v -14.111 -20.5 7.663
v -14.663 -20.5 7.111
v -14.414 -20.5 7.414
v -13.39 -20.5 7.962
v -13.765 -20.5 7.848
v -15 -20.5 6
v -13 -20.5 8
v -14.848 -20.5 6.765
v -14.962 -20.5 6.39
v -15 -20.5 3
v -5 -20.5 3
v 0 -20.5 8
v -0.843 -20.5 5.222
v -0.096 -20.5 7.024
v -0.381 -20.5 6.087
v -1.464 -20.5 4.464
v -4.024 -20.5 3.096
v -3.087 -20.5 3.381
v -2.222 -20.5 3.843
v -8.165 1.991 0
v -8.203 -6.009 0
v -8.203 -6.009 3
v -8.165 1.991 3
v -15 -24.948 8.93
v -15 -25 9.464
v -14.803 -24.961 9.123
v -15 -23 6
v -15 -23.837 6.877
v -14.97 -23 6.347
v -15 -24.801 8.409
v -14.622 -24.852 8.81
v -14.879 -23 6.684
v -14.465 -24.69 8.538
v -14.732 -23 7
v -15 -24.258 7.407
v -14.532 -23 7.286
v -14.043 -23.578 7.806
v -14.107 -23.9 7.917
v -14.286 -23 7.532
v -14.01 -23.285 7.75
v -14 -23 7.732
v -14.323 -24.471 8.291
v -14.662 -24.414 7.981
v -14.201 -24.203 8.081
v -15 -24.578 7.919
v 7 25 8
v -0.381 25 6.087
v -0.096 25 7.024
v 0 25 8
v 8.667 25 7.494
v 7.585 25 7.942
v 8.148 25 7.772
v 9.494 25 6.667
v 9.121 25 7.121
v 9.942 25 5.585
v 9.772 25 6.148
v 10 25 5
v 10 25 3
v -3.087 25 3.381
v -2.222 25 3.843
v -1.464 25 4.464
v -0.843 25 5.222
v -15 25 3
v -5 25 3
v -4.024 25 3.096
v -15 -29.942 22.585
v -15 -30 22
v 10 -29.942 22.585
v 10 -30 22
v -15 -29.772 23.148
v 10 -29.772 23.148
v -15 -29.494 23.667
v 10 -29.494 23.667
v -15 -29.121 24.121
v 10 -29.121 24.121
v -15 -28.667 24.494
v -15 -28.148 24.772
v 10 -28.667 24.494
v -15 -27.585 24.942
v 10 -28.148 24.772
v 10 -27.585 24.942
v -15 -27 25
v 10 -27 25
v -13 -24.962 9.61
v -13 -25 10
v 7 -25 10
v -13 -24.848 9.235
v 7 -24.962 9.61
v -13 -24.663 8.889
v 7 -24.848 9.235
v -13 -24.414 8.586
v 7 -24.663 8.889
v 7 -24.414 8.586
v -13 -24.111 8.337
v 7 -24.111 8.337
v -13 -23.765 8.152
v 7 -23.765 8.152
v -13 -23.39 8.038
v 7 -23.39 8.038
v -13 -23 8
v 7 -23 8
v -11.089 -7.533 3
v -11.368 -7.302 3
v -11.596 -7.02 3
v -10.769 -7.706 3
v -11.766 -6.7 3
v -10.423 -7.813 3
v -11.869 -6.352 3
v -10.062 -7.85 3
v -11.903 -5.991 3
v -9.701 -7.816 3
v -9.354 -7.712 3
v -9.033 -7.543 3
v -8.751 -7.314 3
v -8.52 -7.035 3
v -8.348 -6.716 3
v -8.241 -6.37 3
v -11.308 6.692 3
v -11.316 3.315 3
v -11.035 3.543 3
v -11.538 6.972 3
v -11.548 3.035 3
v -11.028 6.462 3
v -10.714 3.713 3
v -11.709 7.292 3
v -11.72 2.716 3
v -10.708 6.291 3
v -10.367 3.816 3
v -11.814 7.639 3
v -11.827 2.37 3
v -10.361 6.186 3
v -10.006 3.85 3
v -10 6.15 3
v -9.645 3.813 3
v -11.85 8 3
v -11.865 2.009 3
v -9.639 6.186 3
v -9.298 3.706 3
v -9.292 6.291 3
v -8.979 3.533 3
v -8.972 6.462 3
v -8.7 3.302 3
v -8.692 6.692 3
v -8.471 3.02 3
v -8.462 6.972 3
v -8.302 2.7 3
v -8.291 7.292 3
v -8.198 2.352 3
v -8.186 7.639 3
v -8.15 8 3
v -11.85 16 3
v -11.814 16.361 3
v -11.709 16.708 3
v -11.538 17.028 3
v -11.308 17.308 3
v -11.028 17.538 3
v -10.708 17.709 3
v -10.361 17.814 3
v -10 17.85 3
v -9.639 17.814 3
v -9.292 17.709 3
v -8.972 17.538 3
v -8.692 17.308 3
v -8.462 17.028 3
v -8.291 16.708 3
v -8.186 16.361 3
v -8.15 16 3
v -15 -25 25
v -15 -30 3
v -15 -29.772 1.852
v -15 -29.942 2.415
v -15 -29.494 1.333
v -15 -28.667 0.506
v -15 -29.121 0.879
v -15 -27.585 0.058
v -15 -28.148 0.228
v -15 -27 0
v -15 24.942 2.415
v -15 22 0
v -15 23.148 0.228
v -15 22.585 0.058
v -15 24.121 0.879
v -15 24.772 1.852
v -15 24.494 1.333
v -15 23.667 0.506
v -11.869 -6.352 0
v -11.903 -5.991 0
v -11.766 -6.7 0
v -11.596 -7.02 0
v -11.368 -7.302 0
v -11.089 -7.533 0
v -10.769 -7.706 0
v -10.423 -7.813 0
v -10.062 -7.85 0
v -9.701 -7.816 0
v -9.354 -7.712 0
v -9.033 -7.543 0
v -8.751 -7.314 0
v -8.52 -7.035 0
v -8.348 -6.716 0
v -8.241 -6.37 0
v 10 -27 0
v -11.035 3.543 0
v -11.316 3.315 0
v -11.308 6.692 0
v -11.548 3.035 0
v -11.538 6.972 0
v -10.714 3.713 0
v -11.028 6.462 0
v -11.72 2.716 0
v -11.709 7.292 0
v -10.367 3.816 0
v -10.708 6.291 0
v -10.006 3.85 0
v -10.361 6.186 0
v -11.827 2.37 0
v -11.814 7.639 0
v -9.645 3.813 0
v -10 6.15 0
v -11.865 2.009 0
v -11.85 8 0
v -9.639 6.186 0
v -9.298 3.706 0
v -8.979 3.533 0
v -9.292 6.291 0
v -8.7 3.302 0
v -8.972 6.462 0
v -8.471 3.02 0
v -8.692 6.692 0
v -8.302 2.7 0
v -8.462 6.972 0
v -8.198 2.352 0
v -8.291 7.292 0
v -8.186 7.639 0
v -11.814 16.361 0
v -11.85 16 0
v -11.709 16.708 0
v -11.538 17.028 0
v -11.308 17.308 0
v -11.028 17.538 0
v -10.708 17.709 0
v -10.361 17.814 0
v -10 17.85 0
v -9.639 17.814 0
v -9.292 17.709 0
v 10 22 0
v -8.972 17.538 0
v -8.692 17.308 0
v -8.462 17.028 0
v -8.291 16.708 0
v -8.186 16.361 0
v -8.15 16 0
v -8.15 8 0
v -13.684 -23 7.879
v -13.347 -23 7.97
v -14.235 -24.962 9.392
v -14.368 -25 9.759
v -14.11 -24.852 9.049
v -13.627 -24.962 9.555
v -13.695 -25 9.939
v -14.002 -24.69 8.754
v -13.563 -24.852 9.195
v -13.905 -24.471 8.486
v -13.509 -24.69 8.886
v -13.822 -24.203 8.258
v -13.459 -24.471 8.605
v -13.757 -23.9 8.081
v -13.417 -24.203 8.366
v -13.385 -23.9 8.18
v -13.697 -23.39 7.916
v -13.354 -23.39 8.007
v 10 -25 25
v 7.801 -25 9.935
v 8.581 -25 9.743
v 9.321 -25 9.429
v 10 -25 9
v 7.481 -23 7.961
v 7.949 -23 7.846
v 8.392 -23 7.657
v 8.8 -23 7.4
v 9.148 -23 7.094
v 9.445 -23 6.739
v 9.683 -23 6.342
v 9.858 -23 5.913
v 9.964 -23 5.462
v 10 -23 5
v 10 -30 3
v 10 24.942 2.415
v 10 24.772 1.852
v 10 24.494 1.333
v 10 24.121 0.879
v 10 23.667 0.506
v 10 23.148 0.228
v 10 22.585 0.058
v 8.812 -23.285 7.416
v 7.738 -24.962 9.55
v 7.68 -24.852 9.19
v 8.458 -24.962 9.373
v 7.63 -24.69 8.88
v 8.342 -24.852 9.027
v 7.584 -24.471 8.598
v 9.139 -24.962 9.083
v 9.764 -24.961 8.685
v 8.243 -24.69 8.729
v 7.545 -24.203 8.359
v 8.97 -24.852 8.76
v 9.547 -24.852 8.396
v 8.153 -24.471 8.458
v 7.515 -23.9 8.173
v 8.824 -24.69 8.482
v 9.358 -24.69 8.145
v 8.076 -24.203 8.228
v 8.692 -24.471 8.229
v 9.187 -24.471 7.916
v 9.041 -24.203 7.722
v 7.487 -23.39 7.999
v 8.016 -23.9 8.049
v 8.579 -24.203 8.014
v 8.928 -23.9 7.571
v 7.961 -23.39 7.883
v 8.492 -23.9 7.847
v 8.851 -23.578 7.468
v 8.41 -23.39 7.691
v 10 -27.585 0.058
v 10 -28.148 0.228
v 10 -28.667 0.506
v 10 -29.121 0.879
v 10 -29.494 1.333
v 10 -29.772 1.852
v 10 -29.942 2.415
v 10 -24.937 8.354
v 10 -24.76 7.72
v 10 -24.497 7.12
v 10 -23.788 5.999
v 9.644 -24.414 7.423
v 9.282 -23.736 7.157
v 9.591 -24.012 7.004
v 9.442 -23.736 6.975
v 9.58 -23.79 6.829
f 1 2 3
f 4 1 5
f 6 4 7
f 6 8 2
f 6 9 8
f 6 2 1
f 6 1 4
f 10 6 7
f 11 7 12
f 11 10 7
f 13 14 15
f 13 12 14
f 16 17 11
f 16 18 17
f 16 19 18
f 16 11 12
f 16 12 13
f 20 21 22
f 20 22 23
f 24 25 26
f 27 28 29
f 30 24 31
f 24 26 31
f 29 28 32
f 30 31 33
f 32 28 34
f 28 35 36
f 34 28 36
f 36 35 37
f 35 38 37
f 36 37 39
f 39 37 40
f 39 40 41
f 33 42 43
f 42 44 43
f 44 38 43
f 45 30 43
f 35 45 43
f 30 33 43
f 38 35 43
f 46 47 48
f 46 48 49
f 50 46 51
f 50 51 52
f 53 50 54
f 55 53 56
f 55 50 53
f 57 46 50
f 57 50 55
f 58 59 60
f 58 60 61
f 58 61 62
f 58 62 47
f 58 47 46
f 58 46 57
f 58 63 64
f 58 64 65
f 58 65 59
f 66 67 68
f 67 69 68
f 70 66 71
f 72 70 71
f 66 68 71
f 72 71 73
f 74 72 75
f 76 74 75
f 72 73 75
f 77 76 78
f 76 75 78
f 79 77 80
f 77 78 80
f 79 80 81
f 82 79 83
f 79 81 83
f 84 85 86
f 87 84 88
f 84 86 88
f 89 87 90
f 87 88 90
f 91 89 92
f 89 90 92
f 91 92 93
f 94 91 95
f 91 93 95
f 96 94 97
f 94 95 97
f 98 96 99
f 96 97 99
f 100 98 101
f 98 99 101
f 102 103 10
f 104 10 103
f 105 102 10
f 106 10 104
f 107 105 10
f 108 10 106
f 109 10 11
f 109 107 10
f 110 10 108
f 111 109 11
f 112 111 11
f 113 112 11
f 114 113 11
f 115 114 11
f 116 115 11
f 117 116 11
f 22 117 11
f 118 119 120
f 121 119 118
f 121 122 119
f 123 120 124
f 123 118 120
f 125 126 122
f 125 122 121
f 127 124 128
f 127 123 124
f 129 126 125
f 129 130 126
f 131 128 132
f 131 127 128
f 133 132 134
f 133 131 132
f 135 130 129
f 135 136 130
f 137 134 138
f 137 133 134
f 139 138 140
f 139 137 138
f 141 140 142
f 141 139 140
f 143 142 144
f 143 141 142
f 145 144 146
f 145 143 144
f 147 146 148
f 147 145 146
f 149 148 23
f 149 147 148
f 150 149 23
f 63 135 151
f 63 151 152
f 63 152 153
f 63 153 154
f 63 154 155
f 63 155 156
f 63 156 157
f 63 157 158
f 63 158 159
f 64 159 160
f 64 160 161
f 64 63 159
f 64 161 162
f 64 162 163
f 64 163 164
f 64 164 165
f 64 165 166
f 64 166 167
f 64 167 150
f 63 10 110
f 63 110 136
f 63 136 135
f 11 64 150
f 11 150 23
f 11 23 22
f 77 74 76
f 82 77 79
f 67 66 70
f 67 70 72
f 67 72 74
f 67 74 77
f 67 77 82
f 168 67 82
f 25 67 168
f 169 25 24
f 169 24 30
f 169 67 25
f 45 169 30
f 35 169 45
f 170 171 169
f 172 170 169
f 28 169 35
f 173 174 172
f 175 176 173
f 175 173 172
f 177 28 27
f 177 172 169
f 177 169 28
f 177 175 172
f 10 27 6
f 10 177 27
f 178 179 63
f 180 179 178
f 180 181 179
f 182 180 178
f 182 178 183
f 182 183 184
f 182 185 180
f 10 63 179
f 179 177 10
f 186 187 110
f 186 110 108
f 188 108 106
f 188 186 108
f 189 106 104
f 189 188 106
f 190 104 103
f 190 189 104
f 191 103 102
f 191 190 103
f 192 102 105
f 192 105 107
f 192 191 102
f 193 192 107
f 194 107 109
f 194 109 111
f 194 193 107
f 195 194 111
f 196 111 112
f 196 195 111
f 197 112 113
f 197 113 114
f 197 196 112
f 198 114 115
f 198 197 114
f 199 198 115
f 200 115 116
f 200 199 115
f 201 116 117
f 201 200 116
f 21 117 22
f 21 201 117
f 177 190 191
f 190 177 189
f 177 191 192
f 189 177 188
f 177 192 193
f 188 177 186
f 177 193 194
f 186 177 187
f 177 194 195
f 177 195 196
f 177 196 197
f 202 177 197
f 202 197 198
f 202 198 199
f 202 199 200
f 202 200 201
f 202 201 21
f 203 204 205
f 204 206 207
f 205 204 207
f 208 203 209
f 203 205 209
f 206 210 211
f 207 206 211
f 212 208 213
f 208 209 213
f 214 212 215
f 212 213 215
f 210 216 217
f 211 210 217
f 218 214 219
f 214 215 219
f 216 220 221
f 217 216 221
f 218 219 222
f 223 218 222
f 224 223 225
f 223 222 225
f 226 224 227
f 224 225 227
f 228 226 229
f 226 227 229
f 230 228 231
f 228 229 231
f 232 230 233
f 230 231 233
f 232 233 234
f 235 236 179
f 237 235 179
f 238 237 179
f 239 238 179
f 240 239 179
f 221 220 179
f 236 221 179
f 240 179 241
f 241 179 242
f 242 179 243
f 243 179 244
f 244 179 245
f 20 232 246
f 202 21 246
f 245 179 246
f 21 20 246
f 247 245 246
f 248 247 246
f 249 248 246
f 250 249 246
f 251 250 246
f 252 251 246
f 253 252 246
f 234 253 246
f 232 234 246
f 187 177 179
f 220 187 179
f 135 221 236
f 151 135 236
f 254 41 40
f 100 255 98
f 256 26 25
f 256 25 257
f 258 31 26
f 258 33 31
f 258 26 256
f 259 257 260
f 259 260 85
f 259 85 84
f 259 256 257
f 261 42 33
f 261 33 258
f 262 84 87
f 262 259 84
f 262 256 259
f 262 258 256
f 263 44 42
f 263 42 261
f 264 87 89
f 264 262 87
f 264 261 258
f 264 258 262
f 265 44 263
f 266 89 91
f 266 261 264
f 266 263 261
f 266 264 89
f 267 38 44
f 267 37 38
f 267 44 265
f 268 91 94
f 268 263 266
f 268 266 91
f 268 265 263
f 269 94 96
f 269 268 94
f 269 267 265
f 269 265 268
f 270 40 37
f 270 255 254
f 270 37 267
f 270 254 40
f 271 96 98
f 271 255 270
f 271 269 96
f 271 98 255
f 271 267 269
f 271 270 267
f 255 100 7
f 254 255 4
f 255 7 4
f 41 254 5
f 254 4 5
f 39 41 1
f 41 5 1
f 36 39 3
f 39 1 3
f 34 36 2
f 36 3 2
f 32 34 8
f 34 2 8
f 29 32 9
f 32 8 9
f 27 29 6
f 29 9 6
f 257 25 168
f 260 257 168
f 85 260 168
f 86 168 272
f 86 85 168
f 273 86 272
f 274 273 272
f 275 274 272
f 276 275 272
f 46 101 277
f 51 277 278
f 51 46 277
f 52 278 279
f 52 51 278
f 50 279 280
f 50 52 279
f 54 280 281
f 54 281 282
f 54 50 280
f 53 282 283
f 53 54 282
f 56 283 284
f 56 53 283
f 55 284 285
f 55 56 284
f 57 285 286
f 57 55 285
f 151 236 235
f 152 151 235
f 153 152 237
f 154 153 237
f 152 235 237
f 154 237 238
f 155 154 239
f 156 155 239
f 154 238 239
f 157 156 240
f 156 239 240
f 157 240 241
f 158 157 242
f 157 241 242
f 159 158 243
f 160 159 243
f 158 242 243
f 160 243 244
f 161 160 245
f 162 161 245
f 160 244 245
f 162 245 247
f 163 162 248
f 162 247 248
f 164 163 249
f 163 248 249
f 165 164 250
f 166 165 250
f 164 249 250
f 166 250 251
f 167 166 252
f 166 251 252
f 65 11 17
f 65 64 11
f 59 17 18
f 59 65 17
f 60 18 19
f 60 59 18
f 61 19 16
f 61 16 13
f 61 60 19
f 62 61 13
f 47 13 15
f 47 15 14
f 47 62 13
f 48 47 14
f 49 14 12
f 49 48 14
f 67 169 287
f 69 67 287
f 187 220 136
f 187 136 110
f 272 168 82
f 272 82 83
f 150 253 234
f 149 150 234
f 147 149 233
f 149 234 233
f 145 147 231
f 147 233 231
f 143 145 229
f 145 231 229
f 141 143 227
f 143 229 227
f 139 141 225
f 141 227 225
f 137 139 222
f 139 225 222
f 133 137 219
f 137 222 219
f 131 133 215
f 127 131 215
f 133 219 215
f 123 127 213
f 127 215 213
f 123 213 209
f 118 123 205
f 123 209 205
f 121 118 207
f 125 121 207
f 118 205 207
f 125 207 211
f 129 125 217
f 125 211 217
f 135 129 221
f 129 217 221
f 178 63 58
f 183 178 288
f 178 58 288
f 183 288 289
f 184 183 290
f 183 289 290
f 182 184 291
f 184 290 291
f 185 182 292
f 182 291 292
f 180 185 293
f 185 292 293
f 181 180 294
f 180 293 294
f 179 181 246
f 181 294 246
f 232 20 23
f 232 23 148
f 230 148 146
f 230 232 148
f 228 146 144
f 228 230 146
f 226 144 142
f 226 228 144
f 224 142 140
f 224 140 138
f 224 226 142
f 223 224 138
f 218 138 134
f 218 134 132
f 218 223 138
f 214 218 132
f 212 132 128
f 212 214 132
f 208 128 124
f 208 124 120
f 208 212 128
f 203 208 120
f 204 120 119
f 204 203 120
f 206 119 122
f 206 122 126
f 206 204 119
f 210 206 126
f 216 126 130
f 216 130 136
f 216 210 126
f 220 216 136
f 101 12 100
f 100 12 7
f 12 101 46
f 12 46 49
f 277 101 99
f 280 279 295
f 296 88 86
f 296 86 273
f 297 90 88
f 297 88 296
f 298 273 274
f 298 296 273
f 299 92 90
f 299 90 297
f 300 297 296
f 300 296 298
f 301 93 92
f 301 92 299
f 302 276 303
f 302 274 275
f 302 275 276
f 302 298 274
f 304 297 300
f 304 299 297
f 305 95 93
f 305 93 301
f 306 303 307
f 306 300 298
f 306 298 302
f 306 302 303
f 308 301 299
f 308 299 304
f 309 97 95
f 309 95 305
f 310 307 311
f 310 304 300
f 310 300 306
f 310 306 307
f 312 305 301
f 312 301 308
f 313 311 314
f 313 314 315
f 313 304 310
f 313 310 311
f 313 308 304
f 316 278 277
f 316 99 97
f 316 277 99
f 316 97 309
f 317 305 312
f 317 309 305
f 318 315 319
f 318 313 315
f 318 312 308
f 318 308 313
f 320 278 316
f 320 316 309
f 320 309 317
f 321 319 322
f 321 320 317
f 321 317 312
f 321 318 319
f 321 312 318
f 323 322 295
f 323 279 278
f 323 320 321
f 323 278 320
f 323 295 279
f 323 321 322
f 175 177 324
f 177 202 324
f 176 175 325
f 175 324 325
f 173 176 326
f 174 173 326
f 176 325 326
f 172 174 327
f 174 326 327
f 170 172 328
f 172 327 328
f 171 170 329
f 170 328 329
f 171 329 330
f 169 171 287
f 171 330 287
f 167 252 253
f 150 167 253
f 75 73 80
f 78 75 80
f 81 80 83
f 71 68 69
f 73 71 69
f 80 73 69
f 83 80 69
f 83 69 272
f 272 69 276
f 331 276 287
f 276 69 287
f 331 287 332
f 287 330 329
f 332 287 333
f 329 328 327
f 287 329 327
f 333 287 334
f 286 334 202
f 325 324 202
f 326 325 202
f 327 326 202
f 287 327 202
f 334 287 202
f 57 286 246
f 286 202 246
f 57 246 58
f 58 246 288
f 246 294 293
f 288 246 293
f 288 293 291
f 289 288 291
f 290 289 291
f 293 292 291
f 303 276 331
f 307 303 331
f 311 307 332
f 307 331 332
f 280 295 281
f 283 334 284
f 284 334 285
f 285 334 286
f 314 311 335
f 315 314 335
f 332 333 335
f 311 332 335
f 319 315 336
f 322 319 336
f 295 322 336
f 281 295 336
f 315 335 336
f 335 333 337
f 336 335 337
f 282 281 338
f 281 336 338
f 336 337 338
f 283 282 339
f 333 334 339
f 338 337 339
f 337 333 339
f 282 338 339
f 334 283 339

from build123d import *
from OCP.BRepFilletAPI import BRepFilletAPI_MakeFillet

# Parameters (mm, degrees)
SKETCH1_W           = 30
SKETCH1_H           = 50
BOSS_EXTRUDE1_DEPTH = 3
SKETCH2_W           = 30
SKETCH2_H           = 5
BOSS_EXTRUDE2_DEPTH = 25
BOSS_EXTRUDE4_START = 3
BOSS_EXTRUDE4_DEPTH = 5
SKETCH6_W           = 5
SKETCH6_H           = 55
CUT_EXTRUDE1_DEPTH  = 35
FILLET3_R           = 5
FILLET5_R           = 3
FILLET5_R_2         = 2
FILLET6_R           = 2


with BuildPart() as part:
    # Sketch1 → Boss-Extrude1 (new body)
    with BuildSketch(Plane.XY):
        Rectangle(SKETCH1_W, SKETCH1_H)
        with BuildLine():
            Line((-11.85, 8), (-11.85, 16))
            ThreePointArc((-11.85, 16), (-10, 17.85), (-8.15, 16))
            Line((-8.15, 16), (-8.15, 8))
            ThreePointArc((-8.15, 8), (-10, 6.15), (-11.85, 8))
        make_face(mode=Mode.SUBTRACT)
        with BuildLine():
            Line((-11.864504809, 2.008993176), (-11.903242133, -5.990913037))
            ThreePointArc((-11.903242133, -5.990913037), (-10.062221828, -7.849849355), (-8.203285509, -6.008829049))
            Line((-8.203285509, -6.008829049), (-8.164548185, 1.991077164))
            ThreePointArc((-8.164548185, 1.991077164), (-10.00556849, 3.850013482), (-11.864504809, 2.008993176))
        make_face(mode=Mode.SUBTRACT)
    extrude(amount=BOSS_EXTRUDE1_DEPTH)

    # Sketch2 → Boss-Extrude2 (add)
    with BuildSketch(Plane.XY):
        with Locations((0, -27.5)):
            Rectangle(SKETCH2_W, SKETCH2_H)
    extrude(amount=BOSS_EXTRUDE2_DEPTH)

    # Sketch4 → Boss-Extrude4 (add)
    with BuildSketch(Plane.XY.offset(BOSS_EXTRUDE4_START)):
        Polygon((15, -25), (0, -25), (-15, -25), (-15, -20.5), (0, -20.5), (0, 25), (15, 25), align=None)
    extrude(amount=BOSS_EXTRUDE4_DEPTH)

    # Sketch6 → Cut-Extrude1 (cut)
    with BuildSketch(Plane.XY):
        with Locations((12.5, -2.5)):
            Rectangle(SKETCH6_W, SKETCH6_H)
    extrude(amount=CUT_EXTRUDE1_DEPTH, mode=Mode.SUBTRACT)

    # Fillet3
    fillet3_edges = [part.edges().sort_by_distance(p)[0] for p in [
        (0, 2.25, 3),
    ]]
    fillet(fillet3_edges, radius=FILLET3_R - 0.0001)  # a hair under: the kernel refuses the full size

    # Fillet5
    fillet5_edges_1 = [part.edges().sort_by_distance(p)[0] for p in [
        (-2.5, -30, 0),
        (-2.5, -30, 25),
        (10, 0, 8),
        (-2.5, 25, 0),
    ]]
    fillet5_edges_2 = [part.edges().sort_by_distance(p)[0] for p in [
        (-15, -22.75, 8),
    ]]
    fillet5 = BRepFilletAPI_MakeFillet(part.part.solid().wrapped)
    for e in fillet5_edges_1:
        fillet5.Add(FILLET5_R - 0.0001, e.wrapped)
    for e in fillet5_edges_2:
        fillet5.Add(FILLET5_R_2 - 0.0001, e.wrapped)
    add(Compound.cast(fillet5.Shape()), mode=Mode.REPLACE)  # a hair under: the kernel refuses the full size

    # Fillet6
    fillet6_edges = [part.edges().sort_by_distance(p)[0] for p in [
        (-3, -25, 8),
        (-14.414242852, -25, 7.414242852),
        (9.121349633, -25, 7.121349633),
    ]]
    fillet(fillet6_edges, radius=FILLET6_R)


solid = part.part
